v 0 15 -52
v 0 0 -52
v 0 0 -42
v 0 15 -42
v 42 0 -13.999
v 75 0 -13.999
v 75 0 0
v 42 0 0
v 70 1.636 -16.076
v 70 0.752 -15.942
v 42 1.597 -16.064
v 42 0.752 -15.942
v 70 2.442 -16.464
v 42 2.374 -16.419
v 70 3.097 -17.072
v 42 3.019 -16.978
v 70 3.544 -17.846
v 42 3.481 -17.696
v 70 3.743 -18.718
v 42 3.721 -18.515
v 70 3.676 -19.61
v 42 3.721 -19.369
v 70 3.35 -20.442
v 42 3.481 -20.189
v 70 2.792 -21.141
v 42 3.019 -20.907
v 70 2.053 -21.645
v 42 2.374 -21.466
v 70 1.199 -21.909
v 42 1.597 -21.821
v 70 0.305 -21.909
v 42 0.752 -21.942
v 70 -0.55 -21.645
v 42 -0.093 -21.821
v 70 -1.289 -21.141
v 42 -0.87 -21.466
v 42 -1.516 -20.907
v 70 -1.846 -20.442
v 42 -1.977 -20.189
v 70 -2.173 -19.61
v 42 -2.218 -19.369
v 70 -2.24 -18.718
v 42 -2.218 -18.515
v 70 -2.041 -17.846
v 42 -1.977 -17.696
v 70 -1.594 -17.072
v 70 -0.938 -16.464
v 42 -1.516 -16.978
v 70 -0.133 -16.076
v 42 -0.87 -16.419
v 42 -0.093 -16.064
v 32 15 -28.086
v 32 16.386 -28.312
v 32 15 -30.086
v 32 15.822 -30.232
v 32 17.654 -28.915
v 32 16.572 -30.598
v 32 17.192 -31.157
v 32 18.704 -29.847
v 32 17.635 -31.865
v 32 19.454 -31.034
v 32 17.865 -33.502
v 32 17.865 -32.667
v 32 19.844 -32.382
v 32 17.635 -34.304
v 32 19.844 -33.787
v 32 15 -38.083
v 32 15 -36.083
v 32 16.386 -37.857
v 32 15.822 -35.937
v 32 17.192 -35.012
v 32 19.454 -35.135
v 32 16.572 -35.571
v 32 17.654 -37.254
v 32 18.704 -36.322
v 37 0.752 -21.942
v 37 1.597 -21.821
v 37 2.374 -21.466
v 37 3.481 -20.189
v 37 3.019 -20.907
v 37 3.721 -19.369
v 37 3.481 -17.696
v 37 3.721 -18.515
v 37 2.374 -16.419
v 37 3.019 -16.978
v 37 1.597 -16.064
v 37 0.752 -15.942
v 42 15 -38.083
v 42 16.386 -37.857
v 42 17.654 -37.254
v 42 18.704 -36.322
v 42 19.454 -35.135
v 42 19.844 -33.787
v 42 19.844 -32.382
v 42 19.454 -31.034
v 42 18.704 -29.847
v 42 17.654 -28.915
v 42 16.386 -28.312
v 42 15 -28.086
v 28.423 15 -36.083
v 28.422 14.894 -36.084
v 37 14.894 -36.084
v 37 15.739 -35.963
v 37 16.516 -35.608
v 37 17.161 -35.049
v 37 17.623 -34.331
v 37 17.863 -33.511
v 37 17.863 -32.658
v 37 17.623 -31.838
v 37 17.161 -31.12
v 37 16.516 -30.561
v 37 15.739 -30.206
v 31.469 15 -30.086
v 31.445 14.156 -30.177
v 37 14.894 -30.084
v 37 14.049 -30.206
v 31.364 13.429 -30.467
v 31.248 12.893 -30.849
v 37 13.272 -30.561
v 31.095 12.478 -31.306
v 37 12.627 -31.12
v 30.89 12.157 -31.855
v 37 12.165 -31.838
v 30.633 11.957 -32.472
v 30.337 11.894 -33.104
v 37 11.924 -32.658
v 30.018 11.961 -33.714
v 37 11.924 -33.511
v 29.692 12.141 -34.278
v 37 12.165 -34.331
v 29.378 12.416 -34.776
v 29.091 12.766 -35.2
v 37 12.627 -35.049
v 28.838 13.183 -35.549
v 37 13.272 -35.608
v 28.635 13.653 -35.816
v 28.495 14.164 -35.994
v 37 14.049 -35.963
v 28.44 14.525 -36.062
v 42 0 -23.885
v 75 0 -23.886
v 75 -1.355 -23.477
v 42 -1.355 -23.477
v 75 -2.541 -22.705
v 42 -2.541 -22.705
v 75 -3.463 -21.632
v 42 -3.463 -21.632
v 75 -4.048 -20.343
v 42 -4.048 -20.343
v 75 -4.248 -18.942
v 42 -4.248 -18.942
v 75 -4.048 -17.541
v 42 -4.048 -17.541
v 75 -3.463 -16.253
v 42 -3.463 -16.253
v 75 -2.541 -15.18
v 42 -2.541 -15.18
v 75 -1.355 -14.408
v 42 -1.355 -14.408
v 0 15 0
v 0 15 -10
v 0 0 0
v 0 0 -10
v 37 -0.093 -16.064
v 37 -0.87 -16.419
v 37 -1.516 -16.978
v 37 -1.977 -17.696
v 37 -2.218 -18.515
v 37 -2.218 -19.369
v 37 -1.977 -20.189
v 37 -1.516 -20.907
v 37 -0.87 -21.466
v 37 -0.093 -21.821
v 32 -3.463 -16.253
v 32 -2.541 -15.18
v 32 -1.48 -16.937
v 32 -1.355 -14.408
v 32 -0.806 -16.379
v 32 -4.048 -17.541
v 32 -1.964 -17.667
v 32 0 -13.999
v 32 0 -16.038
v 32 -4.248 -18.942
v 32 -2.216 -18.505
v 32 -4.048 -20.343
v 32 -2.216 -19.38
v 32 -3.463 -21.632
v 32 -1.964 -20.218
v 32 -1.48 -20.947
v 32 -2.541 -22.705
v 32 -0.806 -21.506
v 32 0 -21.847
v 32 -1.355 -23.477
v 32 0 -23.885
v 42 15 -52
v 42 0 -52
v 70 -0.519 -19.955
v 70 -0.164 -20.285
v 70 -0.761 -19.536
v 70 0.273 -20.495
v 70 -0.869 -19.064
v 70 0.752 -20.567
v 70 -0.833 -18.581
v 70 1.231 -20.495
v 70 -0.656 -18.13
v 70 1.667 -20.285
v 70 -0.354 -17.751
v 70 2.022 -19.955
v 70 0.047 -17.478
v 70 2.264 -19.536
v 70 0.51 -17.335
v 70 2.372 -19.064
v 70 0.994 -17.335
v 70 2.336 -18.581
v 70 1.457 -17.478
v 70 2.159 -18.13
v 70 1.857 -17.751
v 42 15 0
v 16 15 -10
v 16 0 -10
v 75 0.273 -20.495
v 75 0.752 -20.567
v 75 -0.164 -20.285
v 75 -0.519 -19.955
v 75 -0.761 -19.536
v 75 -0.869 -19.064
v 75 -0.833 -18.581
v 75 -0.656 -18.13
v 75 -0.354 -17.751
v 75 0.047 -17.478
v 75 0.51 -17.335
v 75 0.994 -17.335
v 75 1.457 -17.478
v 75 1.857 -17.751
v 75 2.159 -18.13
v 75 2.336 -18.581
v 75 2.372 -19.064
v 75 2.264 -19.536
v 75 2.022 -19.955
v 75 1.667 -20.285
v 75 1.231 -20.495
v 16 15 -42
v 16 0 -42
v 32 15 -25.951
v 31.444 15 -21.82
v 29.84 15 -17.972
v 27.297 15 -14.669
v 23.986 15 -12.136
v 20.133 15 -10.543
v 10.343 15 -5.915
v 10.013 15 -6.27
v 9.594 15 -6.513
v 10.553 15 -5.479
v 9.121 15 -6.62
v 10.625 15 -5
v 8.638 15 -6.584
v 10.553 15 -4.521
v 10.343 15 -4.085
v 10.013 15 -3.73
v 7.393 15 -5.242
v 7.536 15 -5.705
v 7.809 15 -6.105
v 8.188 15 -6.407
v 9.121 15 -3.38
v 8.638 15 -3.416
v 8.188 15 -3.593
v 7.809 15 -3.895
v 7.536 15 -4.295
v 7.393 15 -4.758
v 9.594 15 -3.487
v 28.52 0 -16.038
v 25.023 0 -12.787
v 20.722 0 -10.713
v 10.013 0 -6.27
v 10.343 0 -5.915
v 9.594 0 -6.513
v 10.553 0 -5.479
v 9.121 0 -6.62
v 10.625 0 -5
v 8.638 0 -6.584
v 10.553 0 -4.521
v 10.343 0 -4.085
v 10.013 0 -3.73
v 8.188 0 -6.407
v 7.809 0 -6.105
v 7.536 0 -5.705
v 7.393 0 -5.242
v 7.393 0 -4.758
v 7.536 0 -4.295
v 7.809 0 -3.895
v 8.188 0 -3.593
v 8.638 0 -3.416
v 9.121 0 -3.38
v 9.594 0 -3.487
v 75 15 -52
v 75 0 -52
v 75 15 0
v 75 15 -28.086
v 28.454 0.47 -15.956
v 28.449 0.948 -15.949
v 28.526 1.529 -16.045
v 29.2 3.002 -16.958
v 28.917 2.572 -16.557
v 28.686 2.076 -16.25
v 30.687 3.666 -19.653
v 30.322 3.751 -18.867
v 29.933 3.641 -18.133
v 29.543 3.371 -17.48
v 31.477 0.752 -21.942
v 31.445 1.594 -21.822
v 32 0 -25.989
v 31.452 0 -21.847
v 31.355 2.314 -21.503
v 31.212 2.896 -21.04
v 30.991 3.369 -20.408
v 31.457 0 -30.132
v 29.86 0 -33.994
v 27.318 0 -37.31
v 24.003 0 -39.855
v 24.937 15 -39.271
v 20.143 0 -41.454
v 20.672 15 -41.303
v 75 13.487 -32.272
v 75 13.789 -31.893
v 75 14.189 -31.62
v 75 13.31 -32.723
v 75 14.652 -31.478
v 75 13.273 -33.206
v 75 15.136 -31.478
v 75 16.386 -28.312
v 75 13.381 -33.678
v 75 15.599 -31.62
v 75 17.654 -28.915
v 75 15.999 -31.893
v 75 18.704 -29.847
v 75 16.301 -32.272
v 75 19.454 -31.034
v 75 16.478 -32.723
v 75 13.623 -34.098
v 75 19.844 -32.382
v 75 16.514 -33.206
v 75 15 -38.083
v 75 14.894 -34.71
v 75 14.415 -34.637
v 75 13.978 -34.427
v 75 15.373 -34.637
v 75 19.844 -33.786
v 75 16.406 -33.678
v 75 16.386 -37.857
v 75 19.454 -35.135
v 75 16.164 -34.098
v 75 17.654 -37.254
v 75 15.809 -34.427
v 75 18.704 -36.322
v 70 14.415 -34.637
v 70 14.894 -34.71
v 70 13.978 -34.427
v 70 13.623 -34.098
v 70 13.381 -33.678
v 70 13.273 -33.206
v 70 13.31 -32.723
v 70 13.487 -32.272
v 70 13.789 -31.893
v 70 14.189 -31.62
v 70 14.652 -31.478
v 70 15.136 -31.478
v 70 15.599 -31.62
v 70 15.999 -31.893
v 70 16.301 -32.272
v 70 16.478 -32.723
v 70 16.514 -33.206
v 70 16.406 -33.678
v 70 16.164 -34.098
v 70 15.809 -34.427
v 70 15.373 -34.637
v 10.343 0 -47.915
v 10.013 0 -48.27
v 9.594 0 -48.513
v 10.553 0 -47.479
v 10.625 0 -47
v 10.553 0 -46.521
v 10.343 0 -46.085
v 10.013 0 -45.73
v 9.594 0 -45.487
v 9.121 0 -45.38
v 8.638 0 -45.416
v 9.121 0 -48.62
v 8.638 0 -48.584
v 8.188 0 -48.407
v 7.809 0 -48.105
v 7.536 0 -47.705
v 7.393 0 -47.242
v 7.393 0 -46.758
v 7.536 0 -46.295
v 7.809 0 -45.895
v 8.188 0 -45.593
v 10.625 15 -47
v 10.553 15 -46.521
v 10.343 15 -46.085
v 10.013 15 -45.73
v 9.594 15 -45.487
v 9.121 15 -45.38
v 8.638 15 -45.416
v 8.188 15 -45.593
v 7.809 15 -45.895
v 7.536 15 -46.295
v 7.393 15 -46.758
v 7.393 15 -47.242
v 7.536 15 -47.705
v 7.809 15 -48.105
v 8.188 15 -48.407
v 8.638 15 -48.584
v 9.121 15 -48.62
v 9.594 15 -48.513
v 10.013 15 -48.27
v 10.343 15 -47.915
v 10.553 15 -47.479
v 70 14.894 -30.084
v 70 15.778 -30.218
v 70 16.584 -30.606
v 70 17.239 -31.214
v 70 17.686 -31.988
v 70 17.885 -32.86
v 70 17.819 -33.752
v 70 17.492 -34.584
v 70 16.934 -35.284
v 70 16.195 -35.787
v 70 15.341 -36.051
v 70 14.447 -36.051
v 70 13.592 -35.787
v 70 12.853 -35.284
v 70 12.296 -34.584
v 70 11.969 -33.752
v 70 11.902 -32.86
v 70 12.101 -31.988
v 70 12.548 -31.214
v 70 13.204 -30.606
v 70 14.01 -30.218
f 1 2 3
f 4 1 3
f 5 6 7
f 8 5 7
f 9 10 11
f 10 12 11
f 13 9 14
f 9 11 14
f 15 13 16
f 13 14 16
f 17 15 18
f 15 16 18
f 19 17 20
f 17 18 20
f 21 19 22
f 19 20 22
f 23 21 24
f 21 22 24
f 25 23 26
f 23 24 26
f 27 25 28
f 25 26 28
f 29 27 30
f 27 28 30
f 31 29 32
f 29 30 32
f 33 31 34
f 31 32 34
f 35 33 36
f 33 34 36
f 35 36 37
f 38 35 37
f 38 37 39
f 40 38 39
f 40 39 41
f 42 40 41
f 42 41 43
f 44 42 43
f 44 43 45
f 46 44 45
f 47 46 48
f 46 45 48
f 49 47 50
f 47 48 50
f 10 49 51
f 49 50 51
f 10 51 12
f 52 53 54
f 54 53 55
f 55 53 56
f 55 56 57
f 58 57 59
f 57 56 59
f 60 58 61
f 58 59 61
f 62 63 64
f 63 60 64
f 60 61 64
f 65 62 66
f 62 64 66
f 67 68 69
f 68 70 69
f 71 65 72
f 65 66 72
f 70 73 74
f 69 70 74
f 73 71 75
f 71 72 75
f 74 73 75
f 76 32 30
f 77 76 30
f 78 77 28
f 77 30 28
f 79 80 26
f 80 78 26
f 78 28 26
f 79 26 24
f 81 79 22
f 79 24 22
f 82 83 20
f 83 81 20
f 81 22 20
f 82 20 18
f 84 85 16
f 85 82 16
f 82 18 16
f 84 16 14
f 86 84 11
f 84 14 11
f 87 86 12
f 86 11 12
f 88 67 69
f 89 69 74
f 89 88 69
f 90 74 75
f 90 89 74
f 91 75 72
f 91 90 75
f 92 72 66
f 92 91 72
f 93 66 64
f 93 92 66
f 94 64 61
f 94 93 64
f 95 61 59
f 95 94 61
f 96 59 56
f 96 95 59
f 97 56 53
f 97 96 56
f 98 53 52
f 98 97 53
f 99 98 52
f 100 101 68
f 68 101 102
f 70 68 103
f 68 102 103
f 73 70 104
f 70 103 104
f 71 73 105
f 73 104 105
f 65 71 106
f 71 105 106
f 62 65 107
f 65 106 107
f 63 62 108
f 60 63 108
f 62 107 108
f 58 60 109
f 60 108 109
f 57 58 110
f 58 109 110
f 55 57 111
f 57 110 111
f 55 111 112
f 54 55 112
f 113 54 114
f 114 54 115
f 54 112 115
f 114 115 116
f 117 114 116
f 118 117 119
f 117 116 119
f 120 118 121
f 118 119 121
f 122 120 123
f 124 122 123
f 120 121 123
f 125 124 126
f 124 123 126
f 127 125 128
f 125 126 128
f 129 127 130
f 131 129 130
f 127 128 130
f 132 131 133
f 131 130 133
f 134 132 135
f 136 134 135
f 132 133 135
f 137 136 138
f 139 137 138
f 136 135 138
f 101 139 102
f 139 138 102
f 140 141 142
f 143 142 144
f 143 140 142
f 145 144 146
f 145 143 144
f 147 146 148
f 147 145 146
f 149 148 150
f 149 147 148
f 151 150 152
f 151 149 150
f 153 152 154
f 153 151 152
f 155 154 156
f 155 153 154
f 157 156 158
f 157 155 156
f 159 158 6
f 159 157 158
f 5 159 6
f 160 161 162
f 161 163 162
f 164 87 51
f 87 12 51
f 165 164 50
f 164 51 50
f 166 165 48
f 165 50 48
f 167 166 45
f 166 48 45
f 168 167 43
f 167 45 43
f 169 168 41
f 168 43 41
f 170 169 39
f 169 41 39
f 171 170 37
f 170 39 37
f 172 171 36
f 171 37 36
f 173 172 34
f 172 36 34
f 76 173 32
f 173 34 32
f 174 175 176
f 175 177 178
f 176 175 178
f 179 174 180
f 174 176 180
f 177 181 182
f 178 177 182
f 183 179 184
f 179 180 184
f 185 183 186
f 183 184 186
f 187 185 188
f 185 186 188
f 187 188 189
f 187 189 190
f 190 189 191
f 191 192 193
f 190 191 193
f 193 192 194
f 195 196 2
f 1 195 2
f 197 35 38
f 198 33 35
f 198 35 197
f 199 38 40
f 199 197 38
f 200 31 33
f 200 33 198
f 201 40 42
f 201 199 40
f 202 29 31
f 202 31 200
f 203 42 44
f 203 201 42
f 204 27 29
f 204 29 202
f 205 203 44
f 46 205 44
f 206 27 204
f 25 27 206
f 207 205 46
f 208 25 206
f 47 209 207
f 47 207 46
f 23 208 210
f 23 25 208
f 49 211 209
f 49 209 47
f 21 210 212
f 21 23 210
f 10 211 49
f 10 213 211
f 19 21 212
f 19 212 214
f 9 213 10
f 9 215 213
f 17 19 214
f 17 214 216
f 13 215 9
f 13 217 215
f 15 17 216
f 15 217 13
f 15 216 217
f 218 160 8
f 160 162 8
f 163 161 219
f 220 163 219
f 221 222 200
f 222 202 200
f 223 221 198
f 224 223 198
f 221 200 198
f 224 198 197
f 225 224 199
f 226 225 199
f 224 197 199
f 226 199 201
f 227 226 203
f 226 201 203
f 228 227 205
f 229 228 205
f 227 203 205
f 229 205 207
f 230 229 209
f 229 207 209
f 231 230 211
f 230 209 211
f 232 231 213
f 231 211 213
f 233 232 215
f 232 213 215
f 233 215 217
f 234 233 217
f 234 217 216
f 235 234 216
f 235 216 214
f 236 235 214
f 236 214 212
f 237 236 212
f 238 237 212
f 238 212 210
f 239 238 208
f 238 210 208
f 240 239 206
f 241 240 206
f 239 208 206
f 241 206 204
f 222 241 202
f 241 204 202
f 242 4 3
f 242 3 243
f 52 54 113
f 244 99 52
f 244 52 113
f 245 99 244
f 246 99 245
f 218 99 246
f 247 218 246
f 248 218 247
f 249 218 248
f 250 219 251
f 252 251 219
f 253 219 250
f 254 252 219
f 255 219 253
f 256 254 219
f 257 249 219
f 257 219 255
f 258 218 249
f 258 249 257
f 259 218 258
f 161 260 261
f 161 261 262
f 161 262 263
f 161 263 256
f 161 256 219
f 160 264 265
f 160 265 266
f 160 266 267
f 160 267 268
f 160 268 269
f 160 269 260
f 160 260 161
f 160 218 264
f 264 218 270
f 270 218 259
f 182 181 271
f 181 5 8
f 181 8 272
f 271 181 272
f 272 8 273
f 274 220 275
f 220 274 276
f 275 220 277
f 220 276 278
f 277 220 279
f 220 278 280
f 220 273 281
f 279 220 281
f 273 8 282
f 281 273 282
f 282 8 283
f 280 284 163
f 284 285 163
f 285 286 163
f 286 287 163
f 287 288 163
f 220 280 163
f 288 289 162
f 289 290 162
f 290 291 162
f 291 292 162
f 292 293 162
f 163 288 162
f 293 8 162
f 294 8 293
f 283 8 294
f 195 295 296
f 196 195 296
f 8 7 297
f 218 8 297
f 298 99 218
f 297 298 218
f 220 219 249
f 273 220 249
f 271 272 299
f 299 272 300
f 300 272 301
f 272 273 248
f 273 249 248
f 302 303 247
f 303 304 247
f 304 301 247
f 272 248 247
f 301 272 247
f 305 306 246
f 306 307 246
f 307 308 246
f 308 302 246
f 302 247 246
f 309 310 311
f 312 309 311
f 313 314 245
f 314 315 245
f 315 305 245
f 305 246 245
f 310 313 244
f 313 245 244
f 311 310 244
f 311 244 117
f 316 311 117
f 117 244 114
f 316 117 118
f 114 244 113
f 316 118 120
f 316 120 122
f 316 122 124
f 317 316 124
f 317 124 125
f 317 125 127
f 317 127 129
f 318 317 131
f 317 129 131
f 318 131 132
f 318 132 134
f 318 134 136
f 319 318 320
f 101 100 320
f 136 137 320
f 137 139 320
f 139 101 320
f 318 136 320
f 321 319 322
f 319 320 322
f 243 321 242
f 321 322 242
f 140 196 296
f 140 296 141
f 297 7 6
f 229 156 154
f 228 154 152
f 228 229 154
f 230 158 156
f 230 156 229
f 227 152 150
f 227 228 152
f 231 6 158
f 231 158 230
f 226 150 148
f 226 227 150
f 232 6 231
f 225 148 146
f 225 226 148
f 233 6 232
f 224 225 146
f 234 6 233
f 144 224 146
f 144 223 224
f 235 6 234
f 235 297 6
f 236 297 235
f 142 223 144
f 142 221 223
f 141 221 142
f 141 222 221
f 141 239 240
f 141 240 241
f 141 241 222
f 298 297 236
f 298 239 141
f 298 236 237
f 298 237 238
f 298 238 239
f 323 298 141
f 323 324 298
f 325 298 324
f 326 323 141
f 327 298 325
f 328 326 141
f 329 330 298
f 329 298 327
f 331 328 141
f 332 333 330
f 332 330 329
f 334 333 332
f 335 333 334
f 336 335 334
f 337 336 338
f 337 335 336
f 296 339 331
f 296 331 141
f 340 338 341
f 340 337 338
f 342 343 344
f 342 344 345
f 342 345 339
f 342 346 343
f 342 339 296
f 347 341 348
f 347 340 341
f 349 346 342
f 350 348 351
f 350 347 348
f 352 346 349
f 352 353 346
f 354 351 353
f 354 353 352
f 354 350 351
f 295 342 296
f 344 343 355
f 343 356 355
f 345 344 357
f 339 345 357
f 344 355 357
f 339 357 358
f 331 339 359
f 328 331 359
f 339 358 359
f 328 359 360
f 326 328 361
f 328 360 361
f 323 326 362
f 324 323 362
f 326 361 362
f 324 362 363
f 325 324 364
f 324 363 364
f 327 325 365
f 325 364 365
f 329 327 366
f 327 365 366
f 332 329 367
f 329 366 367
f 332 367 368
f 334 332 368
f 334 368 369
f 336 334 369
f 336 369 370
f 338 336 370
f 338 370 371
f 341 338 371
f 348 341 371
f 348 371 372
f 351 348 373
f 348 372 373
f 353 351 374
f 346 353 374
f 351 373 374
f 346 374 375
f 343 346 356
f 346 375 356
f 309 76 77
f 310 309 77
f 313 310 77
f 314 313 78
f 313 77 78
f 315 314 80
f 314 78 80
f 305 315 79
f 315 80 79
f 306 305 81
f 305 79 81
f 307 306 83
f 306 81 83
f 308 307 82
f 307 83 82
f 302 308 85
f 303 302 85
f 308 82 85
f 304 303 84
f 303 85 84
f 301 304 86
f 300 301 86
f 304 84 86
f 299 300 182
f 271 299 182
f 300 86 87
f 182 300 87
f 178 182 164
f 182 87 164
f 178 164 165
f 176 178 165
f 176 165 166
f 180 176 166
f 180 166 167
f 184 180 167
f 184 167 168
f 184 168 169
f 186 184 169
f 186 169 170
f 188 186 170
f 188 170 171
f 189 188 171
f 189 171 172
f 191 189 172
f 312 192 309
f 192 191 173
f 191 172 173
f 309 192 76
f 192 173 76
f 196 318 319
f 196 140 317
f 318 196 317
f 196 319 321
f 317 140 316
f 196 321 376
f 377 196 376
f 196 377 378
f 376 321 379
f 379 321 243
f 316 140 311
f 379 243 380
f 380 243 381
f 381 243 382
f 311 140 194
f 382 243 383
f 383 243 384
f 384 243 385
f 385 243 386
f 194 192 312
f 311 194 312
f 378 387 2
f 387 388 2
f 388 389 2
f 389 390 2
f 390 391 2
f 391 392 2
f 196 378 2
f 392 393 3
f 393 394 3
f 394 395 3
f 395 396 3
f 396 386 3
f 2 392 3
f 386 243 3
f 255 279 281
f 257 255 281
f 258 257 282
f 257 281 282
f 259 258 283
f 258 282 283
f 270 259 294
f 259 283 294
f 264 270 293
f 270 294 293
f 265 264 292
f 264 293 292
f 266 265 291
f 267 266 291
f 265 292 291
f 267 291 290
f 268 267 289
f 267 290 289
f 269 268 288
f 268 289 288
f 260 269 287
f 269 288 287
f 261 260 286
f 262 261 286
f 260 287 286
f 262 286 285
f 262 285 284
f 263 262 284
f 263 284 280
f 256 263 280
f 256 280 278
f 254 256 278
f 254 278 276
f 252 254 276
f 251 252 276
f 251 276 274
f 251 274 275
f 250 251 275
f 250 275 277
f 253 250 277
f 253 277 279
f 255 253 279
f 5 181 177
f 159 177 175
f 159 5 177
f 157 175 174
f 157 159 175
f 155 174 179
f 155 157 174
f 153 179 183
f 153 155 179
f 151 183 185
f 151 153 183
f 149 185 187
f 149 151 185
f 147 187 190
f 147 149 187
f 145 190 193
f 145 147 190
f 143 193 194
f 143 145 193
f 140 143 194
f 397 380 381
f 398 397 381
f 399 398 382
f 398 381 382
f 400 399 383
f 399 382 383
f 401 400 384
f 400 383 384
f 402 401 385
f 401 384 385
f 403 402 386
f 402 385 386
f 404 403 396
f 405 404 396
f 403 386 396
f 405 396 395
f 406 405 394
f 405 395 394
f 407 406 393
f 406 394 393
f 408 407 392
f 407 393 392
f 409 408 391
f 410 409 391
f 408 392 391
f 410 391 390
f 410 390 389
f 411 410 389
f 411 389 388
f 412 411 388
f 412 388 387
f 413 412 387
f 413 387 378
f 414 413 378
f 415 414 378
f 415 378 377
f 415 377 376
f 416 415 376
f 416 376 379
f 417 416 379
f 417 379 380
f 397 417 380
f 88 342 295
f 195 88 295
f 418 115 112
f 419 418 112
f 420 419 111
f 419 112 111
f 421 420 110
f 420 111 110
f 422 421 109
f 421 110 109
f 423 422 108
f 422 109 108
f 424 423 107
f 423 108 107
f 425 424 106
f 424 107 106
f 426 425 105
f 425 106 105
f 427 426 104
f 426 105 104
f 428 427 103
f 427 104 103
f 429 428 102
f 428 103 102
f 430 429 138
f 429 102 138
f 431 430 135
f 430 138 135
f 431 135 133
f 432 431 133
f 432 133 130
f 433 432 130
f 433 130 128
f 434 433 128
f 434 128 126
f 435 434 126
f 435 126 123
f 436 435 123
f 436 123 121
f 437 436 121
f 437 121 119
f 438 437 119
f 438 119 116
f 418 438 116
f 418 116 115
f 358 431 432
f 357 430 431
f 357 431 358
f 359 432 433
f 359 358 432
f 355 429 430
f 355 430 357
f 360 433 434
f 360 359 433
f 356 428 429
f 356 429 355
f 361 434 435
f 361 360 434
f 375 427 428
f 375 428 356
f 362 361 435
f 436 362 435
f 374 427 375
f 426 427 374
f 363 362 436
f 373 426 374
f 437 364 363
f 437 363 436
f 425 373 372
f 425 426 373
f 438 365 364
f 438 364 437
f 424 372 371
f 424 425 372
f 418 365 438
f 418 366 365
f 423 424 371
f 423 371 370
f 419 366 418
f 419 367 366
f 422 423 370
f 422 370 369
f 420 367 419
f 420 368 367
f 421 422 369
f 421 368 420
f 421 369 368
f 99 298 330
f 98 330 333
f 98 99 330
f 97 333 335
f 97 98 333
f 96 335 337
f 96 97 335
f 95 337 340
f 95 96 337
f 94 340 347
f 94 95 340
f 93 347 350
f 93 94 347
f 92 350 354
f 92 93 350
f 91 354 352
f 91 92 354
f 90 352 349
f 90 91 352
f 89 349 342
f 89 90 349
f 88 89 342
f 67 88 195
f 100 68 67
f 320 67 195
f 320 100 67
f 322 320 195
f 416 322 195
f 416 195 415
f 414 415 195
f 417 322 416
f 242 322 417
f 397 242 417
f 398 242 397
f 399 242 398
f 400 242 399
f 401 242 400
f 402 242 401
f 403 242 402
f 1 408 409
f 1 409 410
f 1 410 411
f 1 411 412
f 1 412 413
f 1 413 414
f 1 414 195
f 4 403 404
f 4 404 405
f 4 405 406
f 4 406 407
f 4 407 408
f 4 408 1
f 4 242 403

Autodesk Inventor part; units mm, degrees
ref_plane "YZ Plane" through (0, 0, 0) normal (1, 0, 0) x (0, 1, 0)
ref_plane "XZ Plane" through (0, 0, 0) normal (0, 1, 0) x (-1, 0, 0)
ref_plane "XY Plane" through (0, 0, 0) normal (0, 0, 1) x (1, 0, 0)
sketch "Sketch4" plane through (0, 0, 0) normal (0, 1, 0) x (-1, 0, 0)
  line L0 (0, 0) -> (-42, 0)
  line L1 (-42, 0) -> (-42, -52)
  line L2 (-42, -52) -> (0, -52)
  line L3 (0, -52) -> (0, 0)
  dimension "d79" = 42
  dimension "d80" = 52
extrude "Extrusion4" add sketch "Sketch4" along normal blind 15
sketch "Sketch5" plane through (0, 15, 0) normal (0, 1, 0) x (1, 0, 0)
  line L0 (0, 0) -> (0, 10)
  line L1 (0, 52) -> (0, 0) projected
  line L2 (0, 52) -> (0, 42)
  circle A0 centre (16, 26) radius 16
  line L3 (42, 0) -> (42, 52) projected
  line L4 (0, 10) -> (42, 10)
  line L5 (0, 42) -> (42, 42)
  point P0 (42, 26)
  point P1 (16, 10)
  point P2 (16, 42)
  dimension "d83" = 10
  dimension "d84" = 10
  dimension "d93" = 32
  dimension "d94" = 26
extrude "Extrusion5" cut sketch "Sketch5" against normal blind 15 contours L5 A0 L1 | A0 L4 L1 | A0
sketch "Sketch10" plane through (42, 0, 0) normal (1, 0, 0) x (0, 0, -1)
  circle A0 centre (5, 7.5) radius 2.65 projected
  line L0 (18.9423, 0.7517) -> (33.0845, 14.8938)
  line L1 (0, 0) -> (52, 0) projected
  line L2 (26, 0) -> (26, 15)
  line L3 (0, 15) -> (52, 15) projected
  line L4 (18.9423, 0.7517) -> (26.0134, 7.8228)
  circle A1 centre (18.9423, 0.7517) radius 1.55
  circle A2 centre (33.0845, 14.8938) radius 1.55
  circle A3 centre (33.0845, 14.8938) radius 5
  circle A4 centre (18.9423, 0.7517) radius 5
  line L5 (52, 0) -> (0, 0)
  point P0 (38.0833, 15)
  point P1 (28.0856, 15)
  point P2 (31.5381, 15)
  point P3 (34.6308, 15)
  point P4 (13.9992, 0)
  point P5 (23.8855, 0)
  point P6 (20.2979, 0)
  point P7 (17.5868, 0)
  point P8 (47, 7.5)
  dimension "d115" = 20
  dimension "d116" = 3.1
  dimension "d117" = 3.1
  dimension "d118" = 10
  dimension "d119" = 10
extrude "Extrusion10" add sketch "Sketch10" against normal blind 10 contours A1 L1 A4 | A3 L3 A2
sketch "Sketch11" plane through (42, 0, 0) normal (1, 0, 0) x (0, 0, -1)
  arc A0 (34.6308, 15) -> (31.5381, 15) centre (33.0845, 14.8938) ccw projected
  circle A1 centre (33.0845, 14.8938) radius 1.55
  point P0 (0, 0)
  point P1 (31.5381, 15)
  point P2 (34.6308, 15)
  dimension "d122" = 3.1
extrude "Extrusion11" cut sketch "Sketch11" against normal blind 30
sketch "Sketch12" plane through (42, 0, 0) normal (1, 0, 0) x (0, 0, -1)
  circle A0 centre (33.0845, 14.8938) radius 1.55 projected
  circle A1 centre (33.0845, 14.8938) radius 3
  point P0 (0, 0)
  dimension "d125" = 6
extrude "Extrusion12" cut sketch "Sketch12" against normal blind 30
sketch "Sketch13" plane through (42, 0, 0) normal (1, 0, 0) x (0, 0, -1)
  circle A0 centre (33.0845, 14.8938) radius 3 projected
  circle A1 centre (33.0845, 14.8938) radius 1.625
  point P0 (0, 0)
  dimension "d128" = 3.25
extrude "Extrusion13" add sketch "Sketch13" against normal blind 5
sketch "Sketch14" plane through (42, 0, 0) normal (1, 0, 0) x (0, 0, -1)
  arc A0 (17.5868, 0) -> (20.2979, 0) centre (18.9423, 0.7517) ccw projected
  circle A1 centre (18.9423, 0.7517) radius 3
  point P0 (0, 0)
  dimension "d131" = 6
extrude "Extrusion14" cut sketch "Sketch14" against normal blind 16
sketch "Sketch15" plane through (42, 0, 0) normal (1, 0, 0) x (0, 0, -1)
  circle A0 centre (18.9423, 0.7517) radius 1.625
  circle A1 centre (18.9423, 0.7517) radius 2.65
  point P0 (0, 0)
  dimension "d134" = 3.25
extrude "Extrusion15" add sketch "Sketch15" against normal blind 5
sketch "Sketch16" plane through (42, 0, -52) normal (1, 0, 0) x (0, 0, -1)
  arc A0 (-20.2979, 0) -> (-17.5868, 0) centre (-18.9423, 0.7517) ccw projected
  circle A1 centre (-18.9423, 0.7517) radius 1.55
  point P0 (-52, 0)
sketch "Sketch18" plane through (0, 0, 0) normal (0, -1, 0) x (1, 0, 0)
  line L0 (0, -10) -> (0, 0) projected
  line L1 (0, -5) -> (9, -5)
  circle A0 centre (9, -5) radius 1.625
  line L2 (0, -52) -> (0, -42) projected
  line L3 (0, -47) -> (9, -47)
  circle A1 centre (9, -47) radius 1.625
  dimension "d144" = 9
  dimension "d145" = 3.25
  dimension "d146" = 9
  dimension "d147" = 3.25
extrude "Extrusion17" cut sketch "Sketch18" against normal blind 26.5
sketch "Sketch19" plane through (42, 0, 0) normal (1, 0, 0) x (0, 0, -1)
  point P0 (0, 0)
sketch "Sketch20" plane through (42, 0, 0) normal (1, 0, 0) x (0, 0, -1)
  point P0 (0, 0)
sketch "Sketch21" plane through (42, 0, 0) normal (1, 0, 0) x (0, 0, -1)
  line L0 (52, 0) -> (42, 0) projected
  line L1 (10, 15) -> (0, 15) projected
  line L2 (52, 0) -> (0, 0)
  line L3 (0, 0) -> (0, 15)
  line L4 (0, 15) -> (52, 15)
  line L5 (52, 15) -> (52, 0)
  circle A0 centre (18.9423, 0.7517) radius 1.625 projected
  circle A1 centre (18.9423, 0.7517) radius 1.625
  circle A2 centre (33.0845, 14.8938) radius 1.625
  circle A3 centre (33.0845, 14.8938) radius 1.625
  arc A4 (38.0833, 15) -> (28.0856, 15) centre (33.0845, 14.8938) ccw projected
  circle A5 centre (33.0845, 14.8938) radius 5
  arc A6 (13.9992, 0) -> (23.8855, 0) centre (18.9423, 0.7517) ccw projected
  circle A7 centre (18.9423, 0.7517) radius 5
  dimension "d150" = 3.25
extrude "Extrusion18" add sketch "Sketch21" along normal blind 33 contours L0 L2 A7 L3 L1 L4 A5 L5 | A6 L2 A0 | L2 A0 A7 | A5 L4 A2 | L4 A2 A4
sketch "Sketch22" plane through (37, 0.7517, -18.9423) normal (-1, 0, 0) x (0, 0, 1)
  circle A0 centre (0, 0) radius 3 projected
  circle A1 centre (0, 0) radius 3
  point P0 (18.9423, -0.7517)
  dimension "d153" = 6
extrude "Extrusion19" cut sketch "Sketch22" against normal blind 33
sketch "Sketch23" plane through (37, 14.8938, -33.0845) normal (-1, 0, 0) x (0, 0, 1)
  arc A0 (4.9989, 0.1062) -> (-4.9989, 0.1062) centre (0, 0) ccw projected
  circle A1 centre (0, 0) radius 3
  point P0 (33.0845, -14.8938)
  dimension "d156" = 6
extrude "Extrusion20" cut sketch "Sketch23" against normal blind 33
properties part number "braket motor1"
